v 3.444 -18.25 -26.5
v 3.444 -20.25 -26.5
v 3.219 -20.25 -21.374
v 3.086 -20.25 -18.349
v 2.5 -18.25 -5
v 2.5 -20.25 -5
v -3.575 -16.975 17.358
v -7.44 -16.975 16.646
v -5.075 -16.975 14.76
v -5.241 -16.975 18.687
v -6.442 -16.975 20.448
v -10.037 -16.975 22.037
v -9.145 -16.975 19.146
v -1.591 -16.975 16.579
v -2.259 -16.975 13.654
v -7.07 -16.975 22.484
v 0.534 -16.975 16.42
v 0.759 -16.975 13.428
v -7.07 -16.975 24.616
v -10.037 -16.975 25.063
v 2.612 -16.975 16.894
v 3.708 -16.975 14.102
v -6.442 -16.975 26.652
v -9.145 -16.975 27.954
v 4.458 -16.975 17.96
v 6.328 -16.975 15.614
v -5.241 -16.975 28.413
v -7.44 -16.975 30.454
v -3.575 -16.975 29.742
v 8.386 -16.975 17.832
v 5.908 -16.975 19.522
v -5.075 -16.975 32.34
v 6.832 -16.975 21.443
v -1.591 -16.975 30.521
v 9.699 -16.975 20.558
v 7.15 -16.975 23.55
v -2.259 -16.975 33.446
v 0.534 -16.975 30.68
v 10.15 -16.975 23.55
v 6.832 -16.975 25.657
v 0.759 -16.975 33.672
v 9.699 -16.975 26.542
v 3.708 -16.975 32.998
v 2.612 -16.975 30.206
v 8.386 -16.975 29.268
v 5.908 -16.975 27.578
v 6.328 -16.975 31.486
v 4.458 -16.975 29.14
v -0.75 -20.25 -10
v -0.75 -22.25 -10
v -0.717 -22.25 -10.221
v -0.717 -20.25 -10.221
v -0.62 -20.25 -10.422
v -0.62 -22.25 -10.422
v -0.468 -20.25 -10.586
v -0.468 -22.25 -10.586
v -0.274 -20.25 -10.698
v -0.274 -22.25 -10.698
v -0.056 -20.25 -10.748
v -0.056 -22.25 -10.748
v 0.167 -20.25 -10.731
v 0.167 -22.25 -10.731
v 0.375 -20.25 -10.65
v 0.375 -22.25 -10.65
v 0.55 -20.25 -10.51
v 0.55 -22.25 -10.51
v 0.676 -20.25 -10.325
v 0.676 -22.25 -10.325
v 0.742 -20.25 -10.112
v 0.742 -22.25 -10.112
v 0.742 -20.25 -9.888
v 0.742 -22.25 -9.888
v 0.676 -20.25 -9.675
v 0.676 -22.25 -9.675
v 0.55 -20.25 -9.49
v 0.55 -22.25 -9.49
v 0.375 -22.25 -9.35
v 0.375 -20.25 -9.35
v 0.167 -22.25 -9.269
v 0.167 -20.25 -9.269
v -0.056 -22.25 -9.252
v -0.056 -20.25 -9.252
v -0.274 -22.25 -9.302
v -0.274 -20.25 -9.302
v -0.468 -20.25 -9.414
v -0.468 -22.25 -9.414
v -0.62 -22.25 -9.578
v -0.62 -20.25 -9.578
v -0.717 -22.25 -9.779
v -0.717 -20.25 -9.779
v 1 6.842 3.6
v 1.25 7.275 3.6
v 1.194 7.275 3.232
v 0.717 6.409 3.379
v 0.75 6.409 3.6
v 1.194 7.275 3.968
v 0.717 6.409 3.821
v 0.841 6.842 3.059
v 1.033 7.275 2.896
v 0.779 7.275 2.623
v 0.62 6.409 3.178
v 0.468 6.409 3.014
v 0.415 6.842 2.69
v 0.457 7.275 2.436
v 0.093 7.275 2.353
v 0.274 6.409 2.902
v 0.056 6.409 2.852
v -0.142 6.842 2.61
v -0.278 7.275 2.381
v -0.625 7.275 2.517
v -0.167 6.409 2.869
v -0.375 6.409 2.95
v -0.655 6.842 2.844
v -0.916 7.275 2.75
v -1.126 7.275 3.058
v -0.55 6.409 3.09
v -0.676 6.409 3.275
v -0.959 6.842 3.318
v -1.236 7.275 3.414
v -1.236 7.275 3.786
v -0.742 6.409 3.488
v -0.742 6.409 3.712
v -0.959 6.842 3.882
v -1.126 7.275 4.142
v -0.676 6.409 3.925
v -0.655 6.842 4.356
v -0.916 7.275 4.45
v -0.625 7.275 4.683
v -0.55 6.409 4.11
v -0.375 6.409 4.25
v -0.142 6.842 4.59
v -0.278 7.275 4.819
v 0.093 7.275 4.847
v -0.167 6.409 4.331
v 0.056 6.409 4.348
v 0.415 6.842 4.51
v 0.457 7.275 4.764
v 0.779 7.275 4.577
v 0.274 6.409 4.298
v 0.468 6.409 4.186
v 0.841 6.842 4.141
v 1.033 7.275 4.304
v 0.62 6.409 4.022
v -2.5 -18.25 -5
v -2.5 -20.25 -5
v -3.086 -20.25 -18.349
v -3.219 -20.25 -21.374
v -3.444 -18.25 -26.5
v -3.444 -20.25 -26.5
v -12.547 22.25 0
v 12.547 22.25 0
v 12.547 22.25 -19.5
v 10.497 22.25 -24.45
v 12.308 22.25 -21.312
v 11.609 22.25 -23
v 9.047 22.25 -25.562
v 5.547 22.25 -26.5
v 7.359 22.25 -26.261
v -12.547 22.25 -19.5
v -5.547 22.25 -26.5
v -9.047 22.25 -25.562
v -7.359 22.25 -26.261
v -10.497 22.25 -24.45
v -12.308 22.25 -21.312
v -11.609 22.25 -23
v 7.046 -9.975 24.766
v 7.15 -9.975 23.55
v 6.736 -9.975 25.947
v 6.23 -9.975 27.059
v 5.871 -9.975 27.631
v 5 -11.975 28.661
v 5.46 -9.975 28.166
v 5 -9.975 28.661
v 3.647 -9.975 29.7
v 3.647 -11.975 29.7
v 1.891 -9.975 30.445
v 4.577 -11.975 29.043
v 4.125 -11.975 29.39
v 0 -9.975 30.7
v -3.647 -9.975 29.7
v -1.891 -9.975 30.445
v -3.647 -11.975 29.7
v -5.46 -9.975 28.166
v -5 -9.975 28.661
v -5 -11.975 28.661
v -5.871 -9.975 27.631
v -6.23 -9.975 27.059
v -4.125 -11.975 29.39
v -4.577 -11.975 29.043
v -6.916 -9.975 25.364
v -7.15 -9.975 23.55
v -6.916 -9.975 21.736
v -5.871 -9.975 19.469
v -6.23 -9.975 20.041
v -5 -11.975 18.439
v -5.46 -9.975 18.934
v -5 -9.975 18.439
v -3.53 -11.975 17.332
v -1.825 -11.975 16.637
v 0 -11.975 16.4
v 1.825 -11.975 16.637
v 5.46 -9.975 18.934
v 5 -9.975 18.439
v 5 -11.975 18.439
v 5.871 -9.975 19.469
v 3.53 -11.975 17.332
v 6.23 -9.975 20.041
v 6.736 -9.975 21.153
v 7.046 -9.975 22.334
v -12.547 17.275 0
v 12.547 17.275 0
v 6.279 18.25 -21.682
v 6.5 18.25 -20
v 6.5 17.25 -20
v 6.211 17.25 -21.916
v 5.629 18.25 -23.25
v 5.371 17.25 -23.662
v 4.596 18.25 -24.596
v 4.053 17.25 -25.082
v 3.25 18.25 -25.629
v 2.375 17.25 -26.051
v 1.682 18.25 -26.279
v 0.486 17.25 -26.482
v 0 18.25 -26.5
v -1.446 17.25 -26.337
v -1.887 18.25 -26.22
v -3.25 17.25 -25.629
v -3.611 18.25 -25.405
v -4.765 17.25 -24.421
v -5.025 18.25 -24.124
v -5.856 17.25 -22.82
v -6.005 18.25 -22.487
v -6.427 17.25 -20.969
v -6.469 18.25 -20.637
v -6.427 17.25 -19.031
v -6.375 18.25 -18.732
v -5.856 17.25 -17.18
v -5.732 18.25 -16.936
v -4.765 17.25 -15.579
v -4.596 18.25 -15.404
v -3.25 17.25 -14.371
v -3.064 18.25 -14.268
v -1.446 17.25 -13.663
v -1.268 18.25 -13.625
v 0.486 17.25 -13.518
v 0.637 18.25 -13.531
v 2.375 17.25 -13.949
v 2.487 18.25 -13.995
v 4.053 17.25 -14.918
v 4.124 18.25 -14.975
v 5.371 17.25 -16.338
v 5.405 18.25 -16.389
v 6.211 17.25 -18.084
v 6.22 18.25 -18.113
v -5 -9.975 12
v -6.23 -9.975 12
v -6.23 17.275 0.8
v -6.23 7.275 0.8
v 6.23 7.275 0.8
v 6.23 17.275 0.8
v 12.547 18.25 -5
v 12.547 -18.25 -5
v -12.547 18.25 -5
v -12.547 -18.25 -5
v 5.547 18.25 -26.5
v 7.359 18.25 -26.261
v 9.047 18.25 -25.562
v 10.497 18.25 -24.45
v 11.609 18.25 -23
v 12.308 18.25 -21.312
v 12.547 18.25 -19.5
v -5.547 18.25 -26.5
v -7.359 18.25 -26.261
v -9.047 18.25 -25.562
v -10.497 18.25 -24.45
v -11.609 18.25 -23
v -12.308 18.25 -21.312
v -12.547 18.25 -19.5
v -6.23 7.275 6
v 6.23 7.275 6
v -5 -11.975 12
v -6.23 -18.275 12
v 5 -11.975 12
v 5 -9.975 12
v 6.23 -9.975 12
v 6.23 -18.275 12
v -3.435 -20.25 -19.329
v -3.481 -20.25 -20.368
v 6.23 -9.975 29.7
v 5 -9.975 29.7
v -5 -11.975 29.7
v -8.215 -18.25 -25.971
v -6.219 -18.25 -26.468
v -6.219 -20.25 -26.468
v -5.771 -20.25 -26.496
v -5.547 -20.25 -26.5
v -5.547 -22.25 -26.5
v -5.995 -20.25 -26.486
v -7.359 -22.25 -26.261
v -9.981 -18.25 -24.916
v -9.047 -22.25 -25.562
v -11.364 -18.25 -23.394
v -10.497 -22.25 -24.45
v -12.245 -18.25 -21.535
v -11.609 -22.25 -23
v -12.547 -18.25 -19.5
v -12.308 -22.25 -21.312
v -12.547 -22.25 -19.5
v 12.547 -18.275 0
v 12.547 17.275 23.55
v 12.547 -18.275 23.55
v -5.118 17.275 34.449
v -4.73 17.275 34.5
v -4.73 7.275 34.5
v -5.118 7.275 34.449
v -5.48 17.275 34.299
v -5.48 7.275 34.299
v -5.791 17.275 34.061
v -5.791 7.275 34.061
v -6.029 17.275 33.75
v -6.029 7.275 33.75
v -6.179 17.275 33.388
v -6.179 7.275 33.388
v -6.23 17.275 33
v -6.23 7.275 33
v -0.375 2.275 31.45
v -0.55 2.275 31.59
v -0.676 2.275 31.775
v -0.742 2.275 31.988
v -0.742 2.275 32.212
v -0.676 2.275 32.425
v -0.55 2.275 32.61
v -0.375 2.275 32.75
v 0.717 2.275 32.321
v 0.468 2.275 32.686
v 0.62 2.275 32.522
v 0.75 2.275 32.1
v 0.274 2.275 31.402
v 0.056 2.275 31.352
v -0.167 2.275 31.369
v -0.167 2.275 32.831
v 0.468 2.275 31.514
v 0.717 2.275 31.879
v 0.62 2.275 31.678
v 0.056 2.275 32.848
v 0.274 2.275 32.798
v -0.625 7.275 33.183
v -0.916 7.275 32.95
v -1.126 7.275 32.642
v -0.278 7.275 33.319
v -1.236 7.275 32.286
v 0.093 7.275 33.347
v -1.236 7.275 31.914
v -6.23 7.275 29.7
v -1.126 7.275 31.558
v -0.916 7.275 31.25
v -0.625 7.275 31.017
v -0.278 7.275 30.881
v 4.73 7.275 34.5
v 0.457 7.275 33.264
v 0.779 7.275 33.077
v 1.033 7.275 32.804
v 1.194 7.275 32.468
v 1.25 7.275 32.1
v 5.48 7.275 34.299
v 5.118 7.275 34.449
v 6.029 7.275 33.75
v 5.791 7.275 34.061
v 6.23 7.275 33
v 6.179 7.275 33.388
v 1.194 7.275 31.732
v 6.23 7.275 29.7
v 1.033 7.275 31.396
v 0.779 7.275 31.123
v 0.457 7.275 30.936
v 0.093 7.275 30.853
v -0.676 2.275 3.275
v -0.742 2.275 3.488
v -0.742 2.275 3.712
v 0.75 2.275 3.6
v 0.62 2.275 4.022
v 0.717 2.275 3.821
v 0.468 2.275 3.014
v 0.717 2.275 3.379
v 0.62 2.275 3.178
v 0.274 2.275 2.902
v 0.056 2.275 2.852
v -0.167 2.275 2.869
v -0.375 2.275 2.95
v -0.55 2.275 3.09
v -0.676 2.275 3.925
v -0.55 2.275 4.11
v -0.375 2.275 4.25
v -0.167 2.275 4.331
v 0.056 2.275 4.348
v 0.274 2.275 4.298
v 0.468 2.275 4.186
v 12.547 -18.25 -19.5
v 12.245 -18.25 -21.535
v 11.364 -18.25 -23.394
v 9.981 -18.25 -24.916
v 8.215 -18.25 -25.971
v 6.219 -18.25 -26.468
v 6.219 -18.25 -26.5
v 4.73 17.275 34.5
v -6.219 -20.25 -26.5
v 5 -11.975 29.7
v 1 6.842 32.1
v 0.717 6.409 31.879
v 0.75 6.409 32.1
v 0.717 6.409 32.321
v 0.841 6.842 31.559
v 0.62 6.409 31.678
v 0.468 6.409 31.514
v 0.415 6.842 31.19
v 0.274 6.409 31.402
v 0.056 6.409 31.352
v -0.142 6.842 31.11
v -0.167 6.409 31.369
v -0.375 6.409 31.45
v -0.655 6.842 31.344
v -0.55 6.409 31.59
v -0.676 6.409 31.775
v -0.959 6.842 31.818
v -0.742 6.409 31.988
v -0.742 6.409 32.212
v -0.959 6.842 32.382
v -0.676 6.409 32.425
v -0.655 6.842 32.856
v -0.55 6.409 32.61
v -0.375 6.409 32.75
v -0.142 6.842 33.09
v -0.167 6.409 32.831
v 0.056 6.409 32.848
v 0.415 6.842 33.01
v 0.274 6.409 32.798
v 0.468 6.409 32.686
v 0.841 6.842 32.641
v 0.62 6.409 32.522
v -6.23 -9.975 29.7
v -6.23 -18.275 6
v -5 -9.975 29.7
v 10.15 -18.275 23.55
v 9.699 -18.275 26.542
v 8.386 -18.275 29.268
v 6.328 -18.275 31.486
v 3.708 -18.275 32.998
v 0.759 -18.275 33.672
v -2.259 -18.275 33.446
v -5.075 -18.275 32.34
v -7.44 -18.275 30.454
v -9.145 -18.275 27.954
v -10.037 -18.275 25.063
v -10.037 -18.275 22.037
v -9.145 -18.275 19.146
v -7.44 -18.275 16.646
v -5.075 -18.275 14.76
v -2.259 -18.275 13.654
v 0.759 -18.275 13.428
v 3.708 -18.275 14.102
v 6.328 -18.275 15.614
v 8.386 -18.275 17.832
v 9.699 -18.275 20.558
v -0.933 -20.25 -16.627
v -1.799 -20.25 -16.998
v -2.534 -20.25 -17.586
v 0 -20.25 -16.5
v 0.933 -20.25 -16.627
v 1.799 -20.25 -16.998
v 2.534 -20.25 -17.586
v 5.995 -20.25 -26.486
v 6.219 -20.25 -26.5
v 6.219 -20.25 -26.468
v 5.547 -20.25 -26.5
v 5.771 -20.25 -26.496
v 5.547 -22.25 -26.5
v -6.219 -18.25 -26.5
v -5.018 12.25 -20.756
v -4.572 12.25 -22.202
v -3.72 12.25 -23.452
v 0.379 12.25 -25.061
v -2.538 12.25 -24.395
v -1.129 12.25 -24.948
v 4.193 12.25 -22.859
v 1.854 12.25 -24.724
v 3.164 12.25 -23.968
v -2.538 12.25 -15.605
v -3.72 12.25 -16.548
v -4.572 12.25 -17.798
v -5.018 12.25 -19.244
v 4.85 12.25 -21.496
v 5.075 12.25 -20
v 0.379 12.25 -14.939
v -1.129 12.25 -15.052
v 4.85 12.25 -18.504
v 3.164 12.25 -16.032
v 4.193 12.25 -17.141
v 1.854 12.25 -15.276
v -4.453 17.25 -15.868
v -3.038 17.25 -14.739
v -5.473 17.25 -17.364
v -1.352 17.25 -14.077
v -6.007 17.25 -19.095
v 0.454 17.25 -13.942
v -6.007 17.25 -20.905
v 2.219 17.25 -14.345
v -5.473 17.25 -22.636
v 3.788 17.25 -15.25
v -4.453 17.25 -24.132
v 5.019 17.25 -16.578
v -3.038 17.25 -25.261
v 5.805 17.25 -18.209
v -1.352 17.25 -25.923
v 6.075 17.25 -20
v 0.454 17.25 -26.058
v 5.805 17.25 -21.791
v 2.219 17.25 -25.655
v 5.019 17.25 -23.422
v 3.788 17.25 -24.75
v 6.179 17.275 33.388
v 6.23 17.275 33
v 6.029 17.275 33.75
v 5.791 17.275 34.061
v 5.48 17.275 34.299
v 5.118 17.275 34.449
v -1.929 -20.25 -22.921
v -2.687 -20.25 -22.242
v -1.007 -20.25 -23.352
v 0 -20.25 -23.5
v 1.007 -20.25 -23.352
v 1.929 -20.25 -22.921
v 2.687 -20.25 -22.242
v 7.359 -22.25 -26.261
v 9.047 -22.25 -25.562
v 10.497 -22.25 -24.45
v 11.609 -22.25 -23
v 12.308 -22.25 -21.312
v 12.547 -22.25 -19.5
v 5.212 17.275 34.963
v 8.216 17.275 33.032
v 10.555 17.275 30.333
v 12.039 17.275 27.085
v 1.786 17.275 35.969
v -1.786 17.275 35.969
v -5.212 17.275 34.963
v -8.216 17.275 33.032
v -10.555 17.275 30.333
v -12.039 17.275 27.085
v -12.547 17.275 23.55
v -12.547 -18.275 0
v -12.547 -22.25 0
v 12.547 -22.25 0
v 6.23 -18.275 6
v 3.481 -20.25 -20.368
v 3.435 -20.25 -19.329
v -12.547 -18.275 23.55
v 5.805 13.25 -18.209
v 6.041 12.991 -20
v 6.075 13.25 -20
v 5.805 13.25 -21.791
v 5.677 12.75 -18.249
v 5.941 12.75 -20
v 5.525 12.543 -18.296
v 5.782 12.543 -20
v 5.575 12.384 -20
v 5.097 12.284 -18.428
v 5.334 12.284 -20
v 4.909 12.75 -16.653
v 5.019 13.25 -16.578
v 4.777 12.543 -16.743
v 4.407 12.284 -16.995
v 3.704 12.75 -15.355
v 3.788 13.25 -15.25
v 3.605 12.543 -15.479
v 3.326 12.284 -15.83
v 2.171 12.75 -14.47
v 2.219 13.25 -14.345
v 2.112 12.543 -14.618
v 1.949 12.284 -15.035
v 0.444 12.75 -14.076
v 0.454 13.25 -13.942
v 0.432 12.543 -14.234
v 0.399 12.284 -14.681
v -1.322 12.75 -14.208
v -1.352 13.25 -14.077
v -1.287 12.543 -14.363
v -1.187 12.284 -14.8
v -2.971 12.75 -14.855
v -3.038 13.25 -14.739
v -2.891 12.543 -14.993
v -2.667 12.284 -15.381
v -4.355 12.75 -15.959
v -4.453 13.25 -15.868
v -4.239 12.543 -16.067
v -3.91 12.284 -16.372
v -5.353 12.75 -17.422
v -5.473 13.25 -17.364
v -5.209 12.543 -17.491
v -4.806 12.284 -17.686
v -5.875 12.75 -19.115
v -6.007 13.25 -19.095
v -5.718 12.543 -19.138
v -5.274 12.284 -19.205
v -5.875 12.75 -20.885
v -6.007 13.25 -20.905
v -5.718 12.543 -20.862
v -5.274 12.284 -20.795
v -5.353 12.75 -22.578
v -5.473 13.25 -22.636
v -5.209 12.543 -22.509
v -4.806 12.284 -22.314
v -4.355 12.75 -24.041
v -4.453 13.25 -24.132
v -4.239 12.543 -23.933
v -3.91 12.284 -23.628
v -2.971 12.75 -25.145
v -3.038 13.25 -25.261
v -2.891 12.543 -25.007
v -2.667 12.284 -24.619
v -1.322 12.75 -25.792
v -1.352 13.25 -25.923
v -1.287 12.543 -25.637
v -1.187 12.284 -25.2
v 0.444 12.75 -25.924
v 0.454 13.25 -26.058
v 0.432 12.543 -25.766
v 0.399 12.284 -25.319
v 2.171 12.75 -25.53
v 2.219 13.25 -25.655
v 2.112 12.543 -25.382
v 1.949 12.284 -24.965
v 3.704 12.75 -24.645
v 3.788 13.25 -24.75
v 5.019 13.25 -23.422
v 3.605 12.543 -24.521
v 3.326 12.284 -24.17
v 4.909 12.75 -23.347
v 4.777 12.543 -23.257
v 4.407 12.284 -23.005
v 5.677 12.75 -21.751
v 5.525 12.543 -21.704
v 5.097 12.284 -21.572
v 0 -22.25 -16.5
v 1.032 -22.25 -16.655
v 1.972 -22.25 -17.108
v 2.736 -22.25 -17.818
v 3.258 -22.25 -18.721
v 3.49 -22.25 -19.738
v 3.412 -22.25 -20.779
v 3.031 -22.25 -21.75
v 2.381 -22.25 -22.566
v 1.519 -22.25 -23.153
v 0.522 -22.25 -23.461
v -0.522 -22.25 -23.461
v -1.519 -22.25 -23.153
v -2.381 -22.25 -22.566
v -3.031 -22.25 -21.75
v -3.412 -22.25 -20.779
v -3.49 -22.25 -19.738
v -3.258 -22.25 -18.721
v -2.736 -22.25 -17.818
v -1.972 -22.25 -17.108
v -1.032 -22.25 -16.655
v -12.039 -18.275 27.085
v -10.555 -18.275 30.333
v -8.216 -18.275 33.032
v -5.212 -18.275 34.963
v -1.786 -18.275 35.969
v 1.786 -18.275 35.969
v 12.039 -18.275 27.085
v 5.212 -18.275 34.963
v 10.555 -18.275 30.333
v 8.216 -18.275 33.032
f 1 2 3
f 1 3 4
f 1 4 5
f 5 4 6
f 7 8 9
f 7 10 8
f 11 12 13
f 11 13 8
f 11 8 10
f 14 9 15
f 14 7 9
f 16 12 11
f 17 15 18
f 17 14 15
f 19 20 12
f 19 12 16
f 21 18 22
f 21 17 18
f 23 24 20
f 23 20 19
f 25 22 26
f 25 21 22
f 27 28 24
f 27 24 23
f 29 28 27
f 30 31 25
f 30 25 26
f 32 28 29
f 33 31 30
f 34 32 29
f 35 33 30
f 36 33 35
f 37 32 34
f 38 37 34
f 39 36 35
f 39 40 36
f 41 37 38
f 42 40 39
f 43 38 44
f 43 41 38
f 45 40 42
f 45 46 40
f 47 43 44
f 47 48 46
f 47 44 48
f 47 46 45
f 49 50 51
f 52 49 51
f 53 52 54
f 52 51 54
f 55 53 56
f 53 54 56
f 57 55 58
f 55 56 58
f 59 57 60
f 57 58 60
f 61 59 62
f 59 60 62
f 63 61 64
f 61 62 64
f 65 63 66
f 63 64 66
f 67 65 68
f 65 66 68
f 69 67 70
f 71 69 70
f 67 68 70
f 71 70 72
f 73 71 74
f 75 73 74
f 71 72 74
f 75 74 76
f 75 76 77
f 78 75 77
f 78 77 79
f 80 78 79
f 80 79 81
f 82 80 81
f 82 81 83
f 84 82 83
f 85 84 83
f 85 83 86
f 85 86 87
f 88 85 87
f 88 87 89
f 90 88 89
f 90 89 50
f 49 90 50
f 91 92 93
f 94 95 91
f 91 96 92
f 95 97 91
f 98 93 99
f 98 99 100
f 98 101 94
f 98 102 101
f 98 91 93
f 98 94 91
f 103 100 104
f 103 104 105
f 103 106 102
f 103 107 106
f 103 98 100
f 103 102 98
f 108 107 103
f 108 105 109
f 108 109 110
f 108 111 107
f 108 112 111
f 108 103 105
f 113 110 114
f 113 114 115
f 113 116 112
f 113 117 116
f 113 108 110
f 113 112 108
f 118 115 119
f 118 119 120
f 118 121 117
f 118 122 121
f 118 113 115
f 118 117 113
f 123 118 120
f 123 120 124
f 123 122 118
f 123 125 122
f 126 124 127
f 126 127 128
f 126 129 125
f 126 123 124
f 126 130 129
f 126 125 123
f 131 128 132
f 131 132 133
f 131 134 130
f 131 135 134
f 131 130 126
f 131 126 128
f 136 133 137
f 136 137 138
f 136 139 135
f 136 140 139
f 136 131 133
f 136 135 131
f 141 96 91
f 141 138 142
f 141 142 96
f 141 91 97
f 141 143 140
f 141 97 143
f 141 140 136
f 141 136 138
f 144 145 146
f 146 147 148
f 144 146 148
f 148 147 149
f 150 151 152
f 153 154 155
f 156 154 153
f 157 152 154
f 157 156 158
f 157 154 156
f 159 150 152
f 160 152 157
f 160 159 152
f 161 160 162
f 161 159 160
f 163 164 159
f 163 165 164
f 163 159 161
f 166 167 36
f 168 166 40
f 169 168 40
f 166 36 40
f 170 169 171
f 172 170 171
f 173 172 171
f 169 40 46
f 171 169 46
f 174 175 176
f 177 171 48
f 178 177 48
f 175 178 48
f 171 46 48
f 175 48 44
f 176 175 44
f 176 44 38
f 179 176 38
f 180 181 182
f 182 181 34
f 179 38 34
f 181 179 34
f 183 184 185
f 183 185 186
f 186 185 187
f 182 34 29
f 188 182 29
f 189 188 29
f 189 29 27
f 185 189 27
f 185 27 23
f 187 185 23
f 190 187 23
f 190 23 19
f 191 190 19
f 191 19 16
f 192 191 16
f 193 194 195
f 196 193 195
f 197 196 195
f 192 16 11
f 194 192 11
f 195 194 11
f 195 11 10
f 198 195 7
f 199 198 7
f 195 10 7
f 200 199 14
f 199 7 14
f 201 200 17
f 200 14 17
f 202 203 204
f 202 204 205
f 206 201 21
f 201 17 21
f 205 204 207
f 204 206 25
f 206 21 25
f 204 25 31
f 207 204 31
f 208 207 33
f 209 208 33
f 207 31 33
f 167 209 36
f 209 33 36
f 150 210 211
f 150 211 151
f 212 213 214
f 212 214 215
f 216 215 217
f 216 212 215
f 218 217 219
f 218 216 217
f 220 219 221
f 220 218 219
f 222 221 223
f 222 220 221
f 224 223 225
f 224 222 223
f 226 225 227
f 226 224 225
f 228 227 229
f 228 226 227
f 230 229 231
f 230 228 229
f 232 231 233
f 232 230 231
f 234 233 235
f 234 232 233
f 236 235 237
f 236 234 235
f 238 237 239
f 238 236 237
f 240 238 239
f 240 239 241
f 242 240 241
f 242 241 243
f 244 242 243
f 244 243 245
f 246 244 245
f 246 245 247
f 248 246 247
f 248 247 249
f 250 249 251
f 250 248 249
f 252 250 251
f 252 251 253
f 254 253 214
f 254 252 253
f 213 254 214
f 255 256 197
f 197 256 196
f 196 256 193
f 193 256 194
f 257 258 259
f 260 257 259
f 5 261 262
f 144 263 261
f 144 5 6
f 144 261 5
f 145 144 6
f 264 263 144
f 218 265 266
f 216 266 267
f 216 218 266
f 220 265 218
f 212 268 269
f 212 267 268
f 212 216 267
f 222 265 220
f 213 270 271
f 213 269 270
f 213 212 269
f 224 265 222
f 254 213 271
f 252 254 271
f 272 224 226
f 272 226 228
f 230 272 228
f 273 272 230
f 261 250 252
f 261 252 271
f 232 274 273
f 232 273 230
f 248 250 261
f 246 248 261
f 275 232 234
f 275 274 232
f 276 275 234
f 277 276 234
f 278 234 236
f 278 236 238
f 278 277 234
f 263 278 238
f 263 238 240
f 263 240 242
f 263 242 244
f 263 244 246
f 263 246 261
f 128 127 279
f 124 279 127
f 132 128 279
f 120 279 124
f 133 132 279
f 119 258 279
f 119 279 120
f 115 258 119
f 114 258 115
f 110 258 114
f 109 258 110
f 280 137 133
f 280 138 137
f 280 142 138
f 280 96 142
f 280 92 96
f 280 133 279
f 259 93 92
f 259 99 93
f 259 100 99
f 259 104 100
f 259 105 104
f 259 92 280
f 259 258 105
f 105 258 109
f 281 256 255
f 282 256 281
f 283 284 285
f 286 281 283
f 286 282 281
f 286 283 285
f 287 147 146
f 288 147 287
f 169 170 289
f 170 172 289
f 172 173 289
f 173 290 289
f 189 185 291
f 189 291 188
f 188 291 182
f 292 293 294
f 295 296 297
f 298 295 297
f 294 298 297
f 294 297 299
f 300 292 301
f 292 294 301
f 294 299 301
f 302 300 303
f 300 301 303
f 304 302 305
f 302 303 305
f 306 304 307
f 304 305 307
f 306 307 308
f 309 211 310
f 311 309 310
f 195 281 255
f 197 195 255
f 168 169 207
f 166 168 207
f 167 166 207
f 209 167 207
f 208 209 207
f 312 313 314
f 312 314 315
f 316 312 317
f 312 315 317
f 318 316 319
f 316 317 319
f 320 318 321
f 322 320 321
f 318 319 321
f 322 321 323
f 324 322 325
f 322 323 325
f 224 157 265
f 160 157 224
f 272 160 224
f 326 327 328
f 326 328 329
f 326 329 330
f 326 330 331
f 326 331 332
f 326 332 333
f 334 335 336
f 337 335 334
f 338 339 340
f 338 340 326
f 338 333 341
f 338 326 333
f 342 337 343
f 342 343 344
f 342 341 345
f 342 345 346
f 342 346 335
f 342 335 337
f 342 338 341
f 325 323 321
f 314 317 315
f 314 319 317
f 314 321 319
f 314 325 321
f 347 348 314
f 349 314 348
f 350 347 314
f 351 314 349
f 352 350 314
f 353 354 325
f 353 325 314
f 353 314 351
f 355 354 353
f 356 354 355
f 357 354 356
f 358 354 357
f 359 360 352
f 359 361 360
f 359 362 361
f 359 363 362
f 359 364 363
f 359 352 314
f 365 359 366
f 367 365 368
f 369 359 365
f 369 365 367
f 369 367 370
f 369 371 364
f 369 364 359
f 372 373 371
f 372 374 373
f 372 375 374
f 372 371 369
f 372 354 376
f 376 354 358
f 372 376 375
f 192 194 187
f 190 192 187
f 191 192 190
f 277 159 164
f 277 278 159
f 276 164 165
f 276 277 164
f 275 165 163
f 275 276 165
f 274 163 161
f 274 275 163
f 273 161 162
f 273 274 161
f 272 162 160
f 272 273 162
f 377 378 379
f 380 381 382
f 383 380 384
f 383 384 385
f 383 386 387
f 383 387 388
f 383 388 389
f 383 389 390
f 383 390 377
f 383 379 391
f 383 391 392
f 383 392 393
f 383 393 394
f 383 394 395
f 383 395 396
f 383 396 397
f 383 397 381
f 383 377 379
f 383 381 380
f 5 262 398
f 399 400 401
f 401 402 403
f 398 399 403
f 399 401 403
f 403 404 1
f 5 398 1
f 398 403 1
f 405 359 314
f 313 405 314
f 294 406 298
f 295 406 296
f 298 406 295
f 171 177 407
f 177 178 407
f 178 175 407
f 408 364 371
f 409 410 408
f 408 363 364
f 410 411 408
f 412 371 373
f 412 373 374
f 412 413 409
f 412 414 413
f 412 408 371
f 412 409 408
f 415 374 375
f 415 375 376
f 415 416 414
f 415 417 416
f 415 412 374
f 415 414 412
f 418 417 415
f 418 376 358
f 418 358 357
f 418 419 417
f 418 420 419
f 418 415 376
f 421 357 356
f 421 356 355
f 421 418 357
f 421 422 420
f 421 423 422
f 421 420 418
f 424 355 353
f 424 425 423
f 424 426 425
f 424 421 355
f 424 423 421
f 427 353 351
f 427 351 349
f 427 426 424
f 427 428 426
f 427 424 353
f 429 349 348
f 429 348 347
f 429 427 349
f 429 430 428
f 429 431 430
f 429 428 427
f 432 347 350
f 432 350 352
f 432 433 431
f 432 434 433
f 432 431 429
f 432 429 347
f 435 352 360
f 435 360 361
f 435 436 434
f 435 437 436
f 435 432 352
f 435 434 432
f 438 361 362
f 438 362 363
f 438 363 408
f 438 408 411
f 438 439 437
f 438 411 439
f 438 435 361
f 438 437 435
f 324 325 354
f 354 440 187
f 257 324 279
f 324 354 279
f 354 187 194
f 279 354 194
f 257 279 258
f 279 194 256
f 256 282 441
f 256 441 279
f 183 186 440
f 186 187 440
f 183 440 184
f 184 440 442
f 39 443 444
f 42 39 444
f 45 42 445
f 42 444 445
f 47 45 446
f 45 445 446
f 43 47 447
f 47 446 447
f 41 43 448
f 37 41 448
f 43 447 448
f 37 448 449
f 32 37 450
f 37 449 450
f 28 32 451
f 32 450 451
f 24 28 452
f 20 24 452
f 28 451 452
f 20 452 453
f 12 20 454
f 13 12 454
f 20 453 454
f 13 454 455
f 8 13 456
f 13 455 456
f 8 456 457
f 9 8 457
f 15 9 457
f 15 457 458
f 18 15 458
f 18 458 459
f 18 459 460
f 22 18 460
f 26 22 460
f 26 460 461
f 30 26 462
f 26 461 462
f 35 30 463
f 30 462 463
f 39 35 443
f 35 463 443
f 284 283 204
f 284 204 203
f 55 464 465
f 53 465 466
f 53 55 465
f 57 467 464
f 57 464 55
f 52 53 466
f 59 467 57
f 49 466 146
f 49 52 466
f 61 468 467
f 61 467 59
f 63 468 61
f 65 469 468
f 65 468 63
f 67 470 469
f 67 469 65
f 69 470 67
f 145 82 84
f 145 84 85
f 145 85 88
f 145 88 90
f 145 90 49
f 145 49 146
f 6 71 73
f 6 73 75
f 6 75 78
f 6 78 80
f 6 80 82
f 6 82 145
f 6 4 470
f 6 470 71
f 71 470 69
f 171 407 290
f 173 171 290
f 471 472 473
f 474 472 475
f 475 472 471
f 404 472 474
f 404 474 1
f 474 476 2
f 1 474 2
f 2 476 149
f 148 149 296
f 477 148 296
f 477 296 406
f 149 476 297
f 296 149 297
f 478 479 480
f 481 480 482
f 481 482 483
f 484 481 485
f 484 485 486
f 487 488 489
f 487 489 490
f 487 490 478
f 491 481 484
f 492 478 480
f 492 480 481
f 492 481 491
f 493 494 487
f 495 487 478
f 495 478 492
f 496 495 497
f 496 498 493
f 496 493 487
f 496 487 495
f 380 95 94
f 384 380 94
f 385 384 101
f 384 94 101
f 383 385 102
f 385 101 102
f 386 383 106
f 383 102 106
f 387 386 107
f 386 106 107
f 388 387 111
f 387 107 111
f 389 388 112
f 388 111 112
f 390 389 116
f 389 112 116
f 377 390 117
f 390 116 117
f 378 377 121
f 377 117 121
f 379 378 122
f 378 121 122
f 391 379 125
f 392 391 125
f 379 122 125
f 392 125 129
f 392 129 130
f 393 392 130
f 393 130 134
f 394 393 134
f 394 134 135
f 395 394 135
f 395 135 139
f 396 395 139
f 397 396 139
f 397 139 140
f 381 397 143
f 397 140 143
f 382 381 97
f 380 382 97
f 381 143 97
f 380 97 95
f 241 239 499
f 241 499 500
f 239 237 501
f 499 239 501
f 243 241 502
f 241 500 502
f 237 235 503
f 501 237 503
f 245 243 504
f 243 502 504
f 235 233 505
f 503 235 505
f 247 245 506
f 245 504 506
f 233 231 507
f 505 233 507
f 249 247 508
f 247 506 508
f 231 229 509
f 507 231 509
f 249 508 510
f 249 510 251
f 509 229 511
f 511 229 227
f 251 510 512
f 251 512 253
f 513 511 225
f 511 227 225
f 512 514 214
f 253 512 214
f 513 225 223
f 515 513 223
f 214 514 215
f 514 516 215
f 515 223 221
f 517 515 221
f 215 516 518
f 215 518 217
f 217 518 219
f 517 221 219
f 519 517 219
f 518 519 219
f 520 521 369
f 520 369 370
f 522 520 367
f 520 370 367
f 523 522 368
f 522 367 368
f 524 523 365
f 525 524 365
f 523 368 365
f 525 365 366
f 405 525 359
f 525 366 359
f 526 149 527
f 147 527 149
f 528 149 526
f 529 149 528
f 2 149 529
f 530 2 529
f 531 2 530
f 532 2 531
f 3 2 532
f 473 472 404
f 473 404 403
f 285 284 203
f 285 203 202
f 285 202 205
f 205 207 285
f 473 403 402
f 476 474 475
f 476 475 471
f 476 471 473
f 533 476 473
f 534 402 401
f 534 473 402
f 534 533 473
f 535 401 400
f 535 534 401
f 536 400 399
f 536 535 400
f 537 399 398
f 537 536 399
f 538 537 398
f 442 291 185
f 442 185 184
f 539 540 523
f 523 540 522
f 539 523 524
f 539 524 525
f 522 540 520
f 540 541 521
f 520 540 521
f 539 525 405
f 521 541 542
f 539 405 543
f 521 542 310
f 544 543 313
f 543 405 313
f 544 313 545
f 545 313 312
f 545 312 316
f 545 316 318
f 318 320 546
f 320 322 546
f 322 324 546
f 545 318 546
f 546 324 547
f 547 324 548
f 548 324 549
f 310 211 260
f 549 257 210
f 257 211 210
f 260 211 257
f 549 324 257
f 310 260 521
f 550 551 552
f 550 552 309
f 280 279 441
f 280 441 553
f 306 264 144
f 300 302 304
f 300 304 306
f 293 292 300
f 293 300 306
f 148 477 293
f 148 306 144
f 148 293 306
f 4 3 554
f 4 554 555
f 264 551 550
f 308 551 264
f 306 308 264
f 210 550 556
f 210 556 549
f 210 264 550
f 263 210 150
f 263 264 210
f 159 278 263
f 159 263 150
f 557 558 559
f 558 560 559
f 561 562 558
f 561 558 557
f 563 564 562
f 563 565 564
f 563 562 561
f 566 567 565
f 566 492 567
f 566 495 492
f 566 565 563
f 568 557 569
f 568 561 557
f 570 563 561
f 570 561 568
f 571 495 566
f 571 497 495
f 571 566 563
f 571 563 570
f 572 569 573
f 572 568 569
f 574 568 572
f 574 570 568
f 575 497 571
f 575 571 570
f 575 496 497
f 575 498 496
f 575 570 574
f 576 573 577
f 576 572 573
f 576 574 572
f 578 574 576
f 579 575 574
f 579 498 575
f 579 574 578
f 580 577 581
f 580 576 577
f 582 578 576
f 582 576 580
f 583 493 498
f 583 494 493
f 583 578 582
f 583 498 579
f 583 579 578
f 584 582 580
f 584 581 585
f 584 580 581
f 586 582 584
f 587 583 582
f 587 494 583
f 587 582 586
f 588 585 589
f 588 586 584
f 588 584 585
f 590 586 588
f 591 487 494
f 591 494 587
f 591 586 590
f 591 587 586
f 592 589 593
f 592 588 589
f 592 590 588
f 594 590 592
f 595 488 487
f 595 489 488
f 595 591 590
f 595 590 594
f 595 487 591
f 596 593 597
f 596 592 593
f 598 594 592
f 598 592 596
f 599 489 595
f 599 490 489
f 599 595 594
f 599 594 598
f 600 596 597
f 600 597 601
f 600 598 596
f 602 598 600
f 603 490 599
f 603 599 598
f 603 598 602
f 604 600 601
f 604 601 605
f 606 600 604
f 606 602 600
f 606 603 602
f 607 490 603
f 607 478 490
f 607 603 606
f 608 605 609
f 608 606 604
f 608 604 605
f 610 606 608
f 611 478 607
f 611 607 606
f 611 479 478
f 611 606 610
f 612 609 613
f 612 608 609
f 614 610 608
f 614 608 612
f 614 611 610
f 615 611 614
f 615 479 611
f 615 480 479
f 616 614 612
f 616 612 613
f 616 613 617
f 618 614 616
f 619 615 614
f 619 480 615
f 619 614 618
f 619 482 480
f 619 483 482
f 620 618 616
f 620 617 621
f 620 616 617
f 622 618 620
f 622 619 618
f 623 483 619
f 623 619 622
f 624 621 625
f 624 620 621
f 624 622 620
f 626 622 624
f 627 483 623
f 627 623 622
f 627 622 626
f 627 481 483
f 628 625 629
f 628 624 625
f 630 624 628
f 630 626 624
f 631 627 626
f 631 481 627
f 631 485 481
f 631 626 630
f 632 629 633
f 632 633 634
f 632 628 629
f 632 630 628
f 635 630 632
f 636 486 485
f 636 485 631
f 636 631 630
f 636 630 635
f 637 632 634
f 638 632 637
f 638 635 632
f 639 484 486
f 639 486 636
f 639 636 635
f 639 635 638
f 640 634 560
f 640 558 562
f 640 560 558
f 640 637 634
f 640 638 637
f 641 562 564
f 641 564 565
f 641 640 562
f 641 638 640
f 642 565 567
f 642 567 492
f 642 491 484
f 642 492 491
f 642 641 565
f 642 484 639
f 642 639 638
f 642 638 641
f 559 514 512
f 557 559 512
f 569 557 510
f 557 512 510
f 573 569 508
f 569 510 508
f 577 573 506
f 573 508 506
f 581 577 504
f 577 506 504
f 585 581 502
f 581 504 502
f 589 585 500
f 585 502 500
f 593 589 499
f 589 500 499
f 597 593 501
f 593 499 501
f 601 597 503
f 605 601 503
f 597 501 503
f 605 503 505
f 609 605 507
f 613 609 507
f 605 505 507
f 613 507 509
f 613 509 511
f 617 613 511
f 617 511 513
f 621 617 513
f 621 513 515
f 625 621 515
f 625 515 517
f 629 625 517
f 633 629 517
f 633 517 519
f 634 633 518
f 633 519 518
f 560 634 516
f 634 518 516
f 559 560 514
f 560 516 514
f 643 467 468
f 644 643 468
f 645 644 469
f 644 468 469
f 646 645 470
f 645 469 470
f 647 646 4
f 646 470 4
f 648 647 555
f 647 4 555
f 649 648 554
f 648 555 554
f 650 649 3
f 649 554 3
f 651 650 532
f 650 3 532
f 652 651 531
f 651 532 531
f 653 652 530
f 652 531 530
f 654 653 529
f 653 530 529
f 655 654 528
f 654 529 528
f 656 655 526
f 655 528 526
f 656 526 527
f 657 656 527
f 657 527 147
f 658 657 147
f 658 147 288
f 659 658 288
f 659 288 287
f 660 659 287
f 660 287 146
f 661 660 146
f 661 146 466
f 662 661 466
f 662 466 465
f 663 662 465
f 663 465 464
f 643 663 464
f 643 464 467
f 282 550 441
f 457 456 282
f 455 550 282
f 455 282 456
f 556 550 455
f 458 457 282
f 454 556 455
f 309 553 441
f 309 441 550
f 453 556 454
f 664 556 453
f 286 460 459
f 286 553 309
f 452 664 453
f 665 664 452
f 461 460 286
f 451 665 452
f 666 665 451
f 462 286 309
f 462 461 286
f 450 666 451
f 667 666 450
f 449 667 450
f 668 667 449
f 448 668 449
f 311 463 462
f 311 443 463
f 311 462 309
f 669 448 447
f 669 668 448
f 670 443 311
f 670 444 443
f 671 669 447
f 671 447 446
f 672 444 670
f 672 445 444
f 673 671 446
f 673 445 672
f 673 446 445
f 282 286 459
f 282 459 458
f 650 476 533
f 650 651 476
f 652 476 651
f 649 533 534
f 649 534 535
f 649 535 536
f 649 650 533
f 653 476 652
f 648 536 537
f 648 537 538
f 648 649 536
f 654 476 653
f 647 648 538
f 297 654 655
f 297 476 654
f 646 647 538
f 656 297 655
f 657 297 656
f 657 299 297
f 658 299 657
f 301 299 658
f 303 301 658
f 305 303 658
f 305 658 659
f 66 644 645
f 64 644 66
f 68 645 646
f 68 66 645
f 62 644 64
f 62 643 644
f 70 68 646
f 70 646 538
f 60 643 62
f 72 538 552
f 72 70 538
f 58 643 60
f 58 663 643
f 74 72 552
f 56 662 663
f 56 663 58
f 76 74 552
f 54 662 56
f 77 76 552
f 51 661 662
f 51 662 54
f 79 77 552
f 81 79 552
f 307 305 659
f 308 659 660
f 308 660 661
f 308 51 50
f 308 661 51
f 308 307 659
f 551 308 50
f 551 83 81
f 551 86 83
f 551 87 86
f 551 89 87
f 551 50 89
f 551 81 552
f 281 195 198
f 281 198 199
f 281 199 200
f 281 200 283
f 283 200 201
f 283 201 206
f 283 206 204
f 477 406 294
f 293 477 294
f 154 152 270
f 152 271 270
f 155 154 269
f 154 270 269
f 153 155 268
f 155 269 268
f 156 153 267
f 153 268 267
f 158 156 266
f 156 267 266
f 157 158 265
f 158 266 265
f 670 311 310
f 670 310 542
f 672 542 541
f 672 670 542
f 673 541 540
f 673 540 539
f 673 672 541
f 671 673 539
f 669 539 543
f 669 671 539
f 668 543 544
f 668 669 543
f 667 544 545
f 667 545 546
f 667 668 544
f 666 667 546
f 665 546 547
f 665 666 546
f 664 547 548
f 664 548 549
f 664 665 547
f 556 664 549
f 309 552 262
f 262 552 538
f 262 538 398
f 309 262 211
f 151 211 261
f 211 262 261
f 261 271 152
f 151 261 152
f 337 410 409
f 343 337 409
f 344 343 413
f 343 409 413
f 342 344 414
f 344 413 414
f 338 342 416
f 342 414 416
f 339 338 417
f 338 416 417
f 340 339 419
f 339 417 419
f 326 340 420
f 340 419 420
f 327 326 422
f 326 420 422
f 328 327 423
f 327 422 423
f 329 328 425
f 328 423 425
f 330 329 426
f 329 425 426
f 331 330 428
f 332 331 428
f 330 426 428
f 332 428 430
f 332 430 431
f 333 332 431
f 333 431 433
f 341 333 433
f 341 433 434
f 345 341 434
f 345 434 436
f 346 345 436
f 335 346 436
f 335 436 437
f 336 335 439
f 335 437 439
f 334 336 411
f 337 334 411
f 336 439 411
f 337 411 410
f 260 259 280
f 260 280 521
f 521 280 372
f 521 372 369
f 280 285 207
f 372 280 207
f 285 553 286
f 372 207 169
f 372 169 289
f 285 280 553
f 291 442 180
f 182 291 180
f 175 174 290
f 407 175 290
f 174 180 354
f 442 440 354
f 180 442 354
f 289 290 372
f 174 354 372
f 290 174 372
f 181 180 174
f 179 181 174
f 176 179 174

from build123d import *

# Parameters (mm, degrees)
SKETCH4_W                = 12.46
SKETCH4_H                = 17.25
BOSS_EXTRUDE3_DEPTH      = 6
SKETCH8_R                = 12.546781182
SKETCH8_R_2              = 11.15
BOSS_EXTRUDE6_DEPTH      = 8.3
BOSS_EXTRUDE6_DEPTH_BACK = 17.25
BOSS_EXTRUDE4_DEPTH      = 17.25
SKETCH6_R                = 0.75
CUT_EXTRUDE1_DEPTH       = 5
CHAMFER1_SIZE            = 0.5
CHAMFER1_SIZE2           = 0.866025404
SKETCH10_W               = 12.46
SKETCH10_H               = 23.7
CUT_EXTRUDE3_DEPTH       = 17.25
BOSS_EXTRUDE7_DEPTH      = 8.3
BOSS_EXTRUDE9_DEPTH      = 10
SKETCH20_R               = 11.15
SKETCH20_R_2             = 7.15
BOSS_EXTRUDE11_DEPTH     = 8.3
SKETCH21_R               = 10.15
SKETCH21_R_2             = 7.15
CUT_EXTRUDE7_DEPTH       = 1.3
SKETCH11_W               = 10
SKETCH11_H               = 2
CUT_EXTRUDE4_DEPTH       = 23.7
CUT_EXTRUDE8_REACH       = 37.55
SKETCH24_W               = 12.46
SKETCH24_H               = 6
BOSS_EXTRUDE10_DEPTH     = 25.093562
SKETCH18_W               = 21.5
SKETCH18_H               = 12.438292938
CUT_EXTRUDE5_DEPTH       = 2
SKETCH19_R               = 3.5
CUT_EXTRUDE6_DEPTH       = 43.5
CUT_EXTRUDE6_DEPTH_BACK  = 3
FILLET1_R                = 7
SKETCH22_R               = 6.5
BOSS_EXTRUDE12_DEPTH     = 5
SKETCH23_R               = 6.075
BOSS_EXTRUDE13_DEPTH     = 5
FILLET2_R                = 1
BOSS_EXTRUDE15_DEPTH     = 2
CUT_EXTRUDE9_REACH       = 46.5
SKETCH26_R               = 0.75


with BuildPart() as part:
    # Sketch4 → Boss-Extrude3 (new body)
    with BuildSketch(Plane.XY):
        with Locations((0, -1.35)):
            Rectangle(SKETCH4_W, SKETCH4_H)
    extrude(amount=BOSS_EXTRUDE3_DEPTH)



with BuildPart() as body_2:
    # Sketch8 → Boss-Extrude6 (new body, two sides)
    with BuildSketch(Plane(origin=(0, -9.975, 0), x_dir=(-1, 0, 0), z_dir=(0, -1, 0))) as boss_extrude6_sk:
        with Locations((0, -23.55)):
            Circle(SKETCH8_R)
        with Locations((0, -23.55)):
            Circle(SKETCH8_R_2, mode=Mode.SUBTRACT)
    extrude(amount=BOSS_EXTRUDE6_DEPTH)
    extrude(boss_extrude6_sk.sketch, amount=-BOSS_EXTRUDE6_DEPTH_BACK)


with BuildPart() as part_1:
    add(part.part)

    add(body_2.part)  # Boss-Extrude4 merges body 2
    # Sketch5 → Boss-Extrude4 (add)
    with BuildSketch(Plane(origin=(0, 7.275, 0), x_dir=(1, 0, 0), z_dir=(0, 1, 0))):
        with BuildLine():
            Line((12.546781182, -23.55), (12.546781182, 0))
            Line((12.546781182, 0), (6.23, 0))
            Line((6.23, 0), (6.23, -29.7))
            Line((6.23, -29.7), (-6.23, -29.7))
            Line((-6.23, -29.7), (-6.23, 0))
            Line((-6.23, 0), (-12.546781182, 0))
            Line((-12.546781182, 0), (-12.546781182, -23.55))
            ThreePointArc((-12.546781182, -23.55), (0, -36.096781182), (12.546781182, -23.55))
        make_face()
    extrude(amount=-BOSS_EXTRUDE4_DEPTH)

    # Sketch6 → Cut-Extrude1 (cut)
    with BuildSketch(Plane(origin=(0, 7.275, 0), x_dir=(1, 0, 0), z_dir=(0, 1, 0))):
        with Locations((0, -3.6)):
            Circle(SKETCH6_R)
        with Locations((0, -32.1)):
            Circle(SKETCH6_R)
    extrude(amount=-CUT_EXTRUDE1_DEPTH, mode=Mode.SUBTRACT)

    # Chamfer1
    chamfer1_edges = [part_1.edges().sort_by_distance(p)[0] for p in [
        (-0.75, 7.275, 3.6),
        (-0.75, 7.275, 32.1),
    ]]
    chamfer1_side = [part_1.faces().sort_by_distance(p)[0] for p in [
        (0, 7.275, 35.657160381),
    ]]
    chamfer(chamfer1_edges, length=CHAMFER1_SIZE, length2=CHAMFER1_SIZE2, reference=chamfer1_side[0])

    # Sketch10 → Cut-Extrude3 (cut)
    with BuildSketch(Plane(origin=(0, 7.275, 0), x_dir=(1, 0, 0), z_dir=(0, 1, 0))):
        with Locations((0, -17.85)):
            Rectangle(SKETCH10_W, SKETCH10_H)
    extrude(amount=-CUT_EXTRUDE3_DEPTH, mode=Mode.SUBTRACT)

    # Sketch13 → Boss-Extrude7 (add)
    with BuildSketch(Plane.XZ.offset(18.275)):
        with BuildLine():
            Line((-12.546781182, 23.55), (-12.546781182, 0))
            Line((-12.546781182, 0), (12.546781182, 0))
            Line((12.546781182, 0), (12.546781182, 23.55))
            ThreePointArc((12.546781182, 23.55), (0, 11.003218818), (-12.546781182, 23.55))
        make_face()
    extrude(amount=-BOSS_EXTRUDE7_DEPTH)

    # Sketch15 → Boss-Extrude9 (add)
    with BuildSketch(Plane(origin=(0, 7.275, 0), x_dir=(1, 0, 0), z_dir=(0, 1, 0))):
        with BuildLine():
            Line((-12.546781182, 0), (12.546781182, 0))
            Line((12.546781182, 0), (12.546781182, -23.55))
            ThreePointArc((12.546781182, -23.55), (0, -36.096781182), (-12.546781182, -23.55))
            Line((-12.546781182, -23.55), (-12.546781182, 0))
        make_face()
        with BuildLine():
            Line((-6.23, -0.8), (6.23, -0.8))
            Line((6.23, -0.8), (6.23, -33))
            ThreePointArc((6.23, -33), (5.790660172, -34.060660172), (4.73, -34.5))
            Line((4.73, -34.5), (-4.73, -34.5))
            ThreePointArc((-4.73, -34.5), (-5.790660172, -34.060660172), (-6.23, -33))
            Line((-6.23, -33), (-6.23, -0.8))
        make_face(mode=Mode.SUBTRACT)
    extrude(amount=BOSS_EXTRUDE9_DEPTH)

    # Sketch20 → Boss-Extrude11 (add)
    with BuildSketch(Plane.XZ.offset(18.275)):
        with Locations((0, 23.55)):
            Circle(SKETCH20_R)
        with Locations((0, 23.55)):
            Circle(SKETCH20_R_2, mode=Mode.SUBTRACT)
    extrude(amount=-BOSS_EXTRUDE11_DEPTH)

    # Sketch21 → Cut-Extrude7 (cut)
    with BuildSketch(Plane.XZ.offset(18.275)):
        with Locations((0, 23.55)):
            Circle(SKETCH21_R)
        with Locations((0, 23.55)):
            Circle(SKETCH21_R_2, mode=Mode.SUBTRACT)
    extrude(amount=-CUT_EXTRUDE7_DEPTH, mode=Mode.SUBTRACT)

    # Sketch11 → Cut-Extrude4 (cut)
    with BuildSketch(Plane.XY.offset(29.7)):
        with Locations((0, -10.975)):
            Rectangle(SKETCH11_W, SKETCH11_H)
    extrude(amount=-CUT_EXTRUDE4_DEPTH, mode=Mode.SUBTRACT)

    # Sketch24 → Cut-Extrude8 (cut, up to next)
    with BuildSketch(Plane.XZ.offset(18.275), mode=Mode.PRIVATE) as cut_extrude8_sk1:
        with Locations((0, 9)):
            Rectangle(SKETCH24_W, SKETCH24_H)
    cut_extrude8_tool1 = extrude(cut_extrude8_sk1.sketch, amount=-CUT_EXTRUDE8_REACH, mode=Mode.PRIVATE) & part_1.part
    add(cut_extrude8_tool1.solids().sort_by_distance((0, -18.275, 9))[0], mode=Mode.SUBTRACT)

    # Sketch17 → Boss-Extrude10 (add)
    with BuildSketch(Plane(origin=(-12.546781182, 4.728218818, 0), x_dir=(0, -1, 0), z_dir=(1, 0, 0))):
        Polygon((26.978218818, 26.5), (26.978218818, 0), (-17.521781182, 0), (-17.521781182, 26.5), (-13.521781182, 26.5), (-13.521781182, 5), (22.978218818, 5), (22.978218818, 26.5), align=None)
    extrude(amount=BOSS_EXTRUDE10_DEPTH)

    # Sketch18 → Cut-Extrude5 (cut)
    with BuildSketch(Plane.ZX.offset(-18.25)):
        with Locations((-15.75, 0)):
            Rectangle(SKETCH18_W, SKETCH18_H)
    extrude(amount=-CUT_EXTRUDE5_DEPTH, mode=Mode.SUBTRACT)

    # Sketch19 → Cut-Extrude6 (cut, two sides)
    with BuildSketch(Plane.ZX.offset(-20.25)) as cut_extrude6_sk:
        with Locations((-20, 0)):
            Circle(SKETCH19_R)
    extrude(amount=CUT_EXTRUDE6_DEPTH, mode=Mode.SUBTRACT)
    extrude(cut_extrude6_sk.sketch, amount=-CUT_EXTRUDE6_DEPTH_BACK, mode=Mode.SUBTRACT)

    # Fillet1
    fillet1_edges = [part_1.edges().sort_by_distance(p)[0] for p in [
        (12.546780818, -20.25, -26.5),
        (-12.546781182, -20.25, -26.5),
        (12.546780818, 20.25, -26.5),
        (-12.546781182, 20.25, -26.5),
    ]]
    fillet(fillet1_edges, radius=FILLET1_R)

    # Sketch22 → Boss-Extrude12 (add)
    with BuildSketch(Plane(origin=(0, 22.25, 0), x_dir=(1, 0, 0), z_dir=(0, 1, 0))):
        with Locations((0, 20)):
            Circle(SKETCH22_R)
    extrude(amount=-BOSS_EXTRUDE12_DEPTH)

    # Sketch23 → Boss-Extrude13 (add)
    with BuildSketch(Plane.XZ.offset(-17.25)):
        with Locations((0, -20)):
            Circle(SKETCH23_R)
    extrude(amount=BOSS_EXTRUDE13_DEPTH)

    # Fillet2
    fillet2_edges = [part_1.edges().sort_by_distance(p)[0] for p in [
        (-6.075, 12.25, -20),
    ]]
    fillet(fillet2_edges, radius=FILLET2_R)

    # Sketch25 → Boss-Extrude15 (add)
    with BuildSketch(Plane(origin=(0, -20.25, 0), x_dir=(1, 0, 0), z_dir=(0, 1, 0))):
        Polygon((-6.219146469, 5), (-2.5, 5), (-3.1585, 20), (-3.44385, 26.5), (-6.219146469, 26.5), align=None)
        Polygon((6.219146469, 5), (2.5, 5), (3.1585, 20), (3.44385, 26.5), (6.219146469, 26.5), align=None)
    extrude(amount=BOSS_EXTRUDE15_DEPTH)

    # Sketch26 → Cut-Extrude9 (cut, up to next)
    with BuildSketch(Plane(origin=(0, -22.25, 0), x_dir=(-1, 0, 0), z_dir=(0, -1, 0)), mode=Mode.PRIVATE) as cut_extrude9_sk1:
        with Locations((0, 10)):
            Circle(SKETCH26_R)
    cut_extrude9_tool1 = extrude(cut_extrude9_sk1.sketch, amount=-CUT_EXTRUDE9_REACH, mode=Mode.PRIVATE) & part_1.part
    add(cut_extrude9_tool1.solids().sort_by_distance((0, -22.25, -10))[0], mode=Mode.SUBTRACT)


solid = part_1.part
